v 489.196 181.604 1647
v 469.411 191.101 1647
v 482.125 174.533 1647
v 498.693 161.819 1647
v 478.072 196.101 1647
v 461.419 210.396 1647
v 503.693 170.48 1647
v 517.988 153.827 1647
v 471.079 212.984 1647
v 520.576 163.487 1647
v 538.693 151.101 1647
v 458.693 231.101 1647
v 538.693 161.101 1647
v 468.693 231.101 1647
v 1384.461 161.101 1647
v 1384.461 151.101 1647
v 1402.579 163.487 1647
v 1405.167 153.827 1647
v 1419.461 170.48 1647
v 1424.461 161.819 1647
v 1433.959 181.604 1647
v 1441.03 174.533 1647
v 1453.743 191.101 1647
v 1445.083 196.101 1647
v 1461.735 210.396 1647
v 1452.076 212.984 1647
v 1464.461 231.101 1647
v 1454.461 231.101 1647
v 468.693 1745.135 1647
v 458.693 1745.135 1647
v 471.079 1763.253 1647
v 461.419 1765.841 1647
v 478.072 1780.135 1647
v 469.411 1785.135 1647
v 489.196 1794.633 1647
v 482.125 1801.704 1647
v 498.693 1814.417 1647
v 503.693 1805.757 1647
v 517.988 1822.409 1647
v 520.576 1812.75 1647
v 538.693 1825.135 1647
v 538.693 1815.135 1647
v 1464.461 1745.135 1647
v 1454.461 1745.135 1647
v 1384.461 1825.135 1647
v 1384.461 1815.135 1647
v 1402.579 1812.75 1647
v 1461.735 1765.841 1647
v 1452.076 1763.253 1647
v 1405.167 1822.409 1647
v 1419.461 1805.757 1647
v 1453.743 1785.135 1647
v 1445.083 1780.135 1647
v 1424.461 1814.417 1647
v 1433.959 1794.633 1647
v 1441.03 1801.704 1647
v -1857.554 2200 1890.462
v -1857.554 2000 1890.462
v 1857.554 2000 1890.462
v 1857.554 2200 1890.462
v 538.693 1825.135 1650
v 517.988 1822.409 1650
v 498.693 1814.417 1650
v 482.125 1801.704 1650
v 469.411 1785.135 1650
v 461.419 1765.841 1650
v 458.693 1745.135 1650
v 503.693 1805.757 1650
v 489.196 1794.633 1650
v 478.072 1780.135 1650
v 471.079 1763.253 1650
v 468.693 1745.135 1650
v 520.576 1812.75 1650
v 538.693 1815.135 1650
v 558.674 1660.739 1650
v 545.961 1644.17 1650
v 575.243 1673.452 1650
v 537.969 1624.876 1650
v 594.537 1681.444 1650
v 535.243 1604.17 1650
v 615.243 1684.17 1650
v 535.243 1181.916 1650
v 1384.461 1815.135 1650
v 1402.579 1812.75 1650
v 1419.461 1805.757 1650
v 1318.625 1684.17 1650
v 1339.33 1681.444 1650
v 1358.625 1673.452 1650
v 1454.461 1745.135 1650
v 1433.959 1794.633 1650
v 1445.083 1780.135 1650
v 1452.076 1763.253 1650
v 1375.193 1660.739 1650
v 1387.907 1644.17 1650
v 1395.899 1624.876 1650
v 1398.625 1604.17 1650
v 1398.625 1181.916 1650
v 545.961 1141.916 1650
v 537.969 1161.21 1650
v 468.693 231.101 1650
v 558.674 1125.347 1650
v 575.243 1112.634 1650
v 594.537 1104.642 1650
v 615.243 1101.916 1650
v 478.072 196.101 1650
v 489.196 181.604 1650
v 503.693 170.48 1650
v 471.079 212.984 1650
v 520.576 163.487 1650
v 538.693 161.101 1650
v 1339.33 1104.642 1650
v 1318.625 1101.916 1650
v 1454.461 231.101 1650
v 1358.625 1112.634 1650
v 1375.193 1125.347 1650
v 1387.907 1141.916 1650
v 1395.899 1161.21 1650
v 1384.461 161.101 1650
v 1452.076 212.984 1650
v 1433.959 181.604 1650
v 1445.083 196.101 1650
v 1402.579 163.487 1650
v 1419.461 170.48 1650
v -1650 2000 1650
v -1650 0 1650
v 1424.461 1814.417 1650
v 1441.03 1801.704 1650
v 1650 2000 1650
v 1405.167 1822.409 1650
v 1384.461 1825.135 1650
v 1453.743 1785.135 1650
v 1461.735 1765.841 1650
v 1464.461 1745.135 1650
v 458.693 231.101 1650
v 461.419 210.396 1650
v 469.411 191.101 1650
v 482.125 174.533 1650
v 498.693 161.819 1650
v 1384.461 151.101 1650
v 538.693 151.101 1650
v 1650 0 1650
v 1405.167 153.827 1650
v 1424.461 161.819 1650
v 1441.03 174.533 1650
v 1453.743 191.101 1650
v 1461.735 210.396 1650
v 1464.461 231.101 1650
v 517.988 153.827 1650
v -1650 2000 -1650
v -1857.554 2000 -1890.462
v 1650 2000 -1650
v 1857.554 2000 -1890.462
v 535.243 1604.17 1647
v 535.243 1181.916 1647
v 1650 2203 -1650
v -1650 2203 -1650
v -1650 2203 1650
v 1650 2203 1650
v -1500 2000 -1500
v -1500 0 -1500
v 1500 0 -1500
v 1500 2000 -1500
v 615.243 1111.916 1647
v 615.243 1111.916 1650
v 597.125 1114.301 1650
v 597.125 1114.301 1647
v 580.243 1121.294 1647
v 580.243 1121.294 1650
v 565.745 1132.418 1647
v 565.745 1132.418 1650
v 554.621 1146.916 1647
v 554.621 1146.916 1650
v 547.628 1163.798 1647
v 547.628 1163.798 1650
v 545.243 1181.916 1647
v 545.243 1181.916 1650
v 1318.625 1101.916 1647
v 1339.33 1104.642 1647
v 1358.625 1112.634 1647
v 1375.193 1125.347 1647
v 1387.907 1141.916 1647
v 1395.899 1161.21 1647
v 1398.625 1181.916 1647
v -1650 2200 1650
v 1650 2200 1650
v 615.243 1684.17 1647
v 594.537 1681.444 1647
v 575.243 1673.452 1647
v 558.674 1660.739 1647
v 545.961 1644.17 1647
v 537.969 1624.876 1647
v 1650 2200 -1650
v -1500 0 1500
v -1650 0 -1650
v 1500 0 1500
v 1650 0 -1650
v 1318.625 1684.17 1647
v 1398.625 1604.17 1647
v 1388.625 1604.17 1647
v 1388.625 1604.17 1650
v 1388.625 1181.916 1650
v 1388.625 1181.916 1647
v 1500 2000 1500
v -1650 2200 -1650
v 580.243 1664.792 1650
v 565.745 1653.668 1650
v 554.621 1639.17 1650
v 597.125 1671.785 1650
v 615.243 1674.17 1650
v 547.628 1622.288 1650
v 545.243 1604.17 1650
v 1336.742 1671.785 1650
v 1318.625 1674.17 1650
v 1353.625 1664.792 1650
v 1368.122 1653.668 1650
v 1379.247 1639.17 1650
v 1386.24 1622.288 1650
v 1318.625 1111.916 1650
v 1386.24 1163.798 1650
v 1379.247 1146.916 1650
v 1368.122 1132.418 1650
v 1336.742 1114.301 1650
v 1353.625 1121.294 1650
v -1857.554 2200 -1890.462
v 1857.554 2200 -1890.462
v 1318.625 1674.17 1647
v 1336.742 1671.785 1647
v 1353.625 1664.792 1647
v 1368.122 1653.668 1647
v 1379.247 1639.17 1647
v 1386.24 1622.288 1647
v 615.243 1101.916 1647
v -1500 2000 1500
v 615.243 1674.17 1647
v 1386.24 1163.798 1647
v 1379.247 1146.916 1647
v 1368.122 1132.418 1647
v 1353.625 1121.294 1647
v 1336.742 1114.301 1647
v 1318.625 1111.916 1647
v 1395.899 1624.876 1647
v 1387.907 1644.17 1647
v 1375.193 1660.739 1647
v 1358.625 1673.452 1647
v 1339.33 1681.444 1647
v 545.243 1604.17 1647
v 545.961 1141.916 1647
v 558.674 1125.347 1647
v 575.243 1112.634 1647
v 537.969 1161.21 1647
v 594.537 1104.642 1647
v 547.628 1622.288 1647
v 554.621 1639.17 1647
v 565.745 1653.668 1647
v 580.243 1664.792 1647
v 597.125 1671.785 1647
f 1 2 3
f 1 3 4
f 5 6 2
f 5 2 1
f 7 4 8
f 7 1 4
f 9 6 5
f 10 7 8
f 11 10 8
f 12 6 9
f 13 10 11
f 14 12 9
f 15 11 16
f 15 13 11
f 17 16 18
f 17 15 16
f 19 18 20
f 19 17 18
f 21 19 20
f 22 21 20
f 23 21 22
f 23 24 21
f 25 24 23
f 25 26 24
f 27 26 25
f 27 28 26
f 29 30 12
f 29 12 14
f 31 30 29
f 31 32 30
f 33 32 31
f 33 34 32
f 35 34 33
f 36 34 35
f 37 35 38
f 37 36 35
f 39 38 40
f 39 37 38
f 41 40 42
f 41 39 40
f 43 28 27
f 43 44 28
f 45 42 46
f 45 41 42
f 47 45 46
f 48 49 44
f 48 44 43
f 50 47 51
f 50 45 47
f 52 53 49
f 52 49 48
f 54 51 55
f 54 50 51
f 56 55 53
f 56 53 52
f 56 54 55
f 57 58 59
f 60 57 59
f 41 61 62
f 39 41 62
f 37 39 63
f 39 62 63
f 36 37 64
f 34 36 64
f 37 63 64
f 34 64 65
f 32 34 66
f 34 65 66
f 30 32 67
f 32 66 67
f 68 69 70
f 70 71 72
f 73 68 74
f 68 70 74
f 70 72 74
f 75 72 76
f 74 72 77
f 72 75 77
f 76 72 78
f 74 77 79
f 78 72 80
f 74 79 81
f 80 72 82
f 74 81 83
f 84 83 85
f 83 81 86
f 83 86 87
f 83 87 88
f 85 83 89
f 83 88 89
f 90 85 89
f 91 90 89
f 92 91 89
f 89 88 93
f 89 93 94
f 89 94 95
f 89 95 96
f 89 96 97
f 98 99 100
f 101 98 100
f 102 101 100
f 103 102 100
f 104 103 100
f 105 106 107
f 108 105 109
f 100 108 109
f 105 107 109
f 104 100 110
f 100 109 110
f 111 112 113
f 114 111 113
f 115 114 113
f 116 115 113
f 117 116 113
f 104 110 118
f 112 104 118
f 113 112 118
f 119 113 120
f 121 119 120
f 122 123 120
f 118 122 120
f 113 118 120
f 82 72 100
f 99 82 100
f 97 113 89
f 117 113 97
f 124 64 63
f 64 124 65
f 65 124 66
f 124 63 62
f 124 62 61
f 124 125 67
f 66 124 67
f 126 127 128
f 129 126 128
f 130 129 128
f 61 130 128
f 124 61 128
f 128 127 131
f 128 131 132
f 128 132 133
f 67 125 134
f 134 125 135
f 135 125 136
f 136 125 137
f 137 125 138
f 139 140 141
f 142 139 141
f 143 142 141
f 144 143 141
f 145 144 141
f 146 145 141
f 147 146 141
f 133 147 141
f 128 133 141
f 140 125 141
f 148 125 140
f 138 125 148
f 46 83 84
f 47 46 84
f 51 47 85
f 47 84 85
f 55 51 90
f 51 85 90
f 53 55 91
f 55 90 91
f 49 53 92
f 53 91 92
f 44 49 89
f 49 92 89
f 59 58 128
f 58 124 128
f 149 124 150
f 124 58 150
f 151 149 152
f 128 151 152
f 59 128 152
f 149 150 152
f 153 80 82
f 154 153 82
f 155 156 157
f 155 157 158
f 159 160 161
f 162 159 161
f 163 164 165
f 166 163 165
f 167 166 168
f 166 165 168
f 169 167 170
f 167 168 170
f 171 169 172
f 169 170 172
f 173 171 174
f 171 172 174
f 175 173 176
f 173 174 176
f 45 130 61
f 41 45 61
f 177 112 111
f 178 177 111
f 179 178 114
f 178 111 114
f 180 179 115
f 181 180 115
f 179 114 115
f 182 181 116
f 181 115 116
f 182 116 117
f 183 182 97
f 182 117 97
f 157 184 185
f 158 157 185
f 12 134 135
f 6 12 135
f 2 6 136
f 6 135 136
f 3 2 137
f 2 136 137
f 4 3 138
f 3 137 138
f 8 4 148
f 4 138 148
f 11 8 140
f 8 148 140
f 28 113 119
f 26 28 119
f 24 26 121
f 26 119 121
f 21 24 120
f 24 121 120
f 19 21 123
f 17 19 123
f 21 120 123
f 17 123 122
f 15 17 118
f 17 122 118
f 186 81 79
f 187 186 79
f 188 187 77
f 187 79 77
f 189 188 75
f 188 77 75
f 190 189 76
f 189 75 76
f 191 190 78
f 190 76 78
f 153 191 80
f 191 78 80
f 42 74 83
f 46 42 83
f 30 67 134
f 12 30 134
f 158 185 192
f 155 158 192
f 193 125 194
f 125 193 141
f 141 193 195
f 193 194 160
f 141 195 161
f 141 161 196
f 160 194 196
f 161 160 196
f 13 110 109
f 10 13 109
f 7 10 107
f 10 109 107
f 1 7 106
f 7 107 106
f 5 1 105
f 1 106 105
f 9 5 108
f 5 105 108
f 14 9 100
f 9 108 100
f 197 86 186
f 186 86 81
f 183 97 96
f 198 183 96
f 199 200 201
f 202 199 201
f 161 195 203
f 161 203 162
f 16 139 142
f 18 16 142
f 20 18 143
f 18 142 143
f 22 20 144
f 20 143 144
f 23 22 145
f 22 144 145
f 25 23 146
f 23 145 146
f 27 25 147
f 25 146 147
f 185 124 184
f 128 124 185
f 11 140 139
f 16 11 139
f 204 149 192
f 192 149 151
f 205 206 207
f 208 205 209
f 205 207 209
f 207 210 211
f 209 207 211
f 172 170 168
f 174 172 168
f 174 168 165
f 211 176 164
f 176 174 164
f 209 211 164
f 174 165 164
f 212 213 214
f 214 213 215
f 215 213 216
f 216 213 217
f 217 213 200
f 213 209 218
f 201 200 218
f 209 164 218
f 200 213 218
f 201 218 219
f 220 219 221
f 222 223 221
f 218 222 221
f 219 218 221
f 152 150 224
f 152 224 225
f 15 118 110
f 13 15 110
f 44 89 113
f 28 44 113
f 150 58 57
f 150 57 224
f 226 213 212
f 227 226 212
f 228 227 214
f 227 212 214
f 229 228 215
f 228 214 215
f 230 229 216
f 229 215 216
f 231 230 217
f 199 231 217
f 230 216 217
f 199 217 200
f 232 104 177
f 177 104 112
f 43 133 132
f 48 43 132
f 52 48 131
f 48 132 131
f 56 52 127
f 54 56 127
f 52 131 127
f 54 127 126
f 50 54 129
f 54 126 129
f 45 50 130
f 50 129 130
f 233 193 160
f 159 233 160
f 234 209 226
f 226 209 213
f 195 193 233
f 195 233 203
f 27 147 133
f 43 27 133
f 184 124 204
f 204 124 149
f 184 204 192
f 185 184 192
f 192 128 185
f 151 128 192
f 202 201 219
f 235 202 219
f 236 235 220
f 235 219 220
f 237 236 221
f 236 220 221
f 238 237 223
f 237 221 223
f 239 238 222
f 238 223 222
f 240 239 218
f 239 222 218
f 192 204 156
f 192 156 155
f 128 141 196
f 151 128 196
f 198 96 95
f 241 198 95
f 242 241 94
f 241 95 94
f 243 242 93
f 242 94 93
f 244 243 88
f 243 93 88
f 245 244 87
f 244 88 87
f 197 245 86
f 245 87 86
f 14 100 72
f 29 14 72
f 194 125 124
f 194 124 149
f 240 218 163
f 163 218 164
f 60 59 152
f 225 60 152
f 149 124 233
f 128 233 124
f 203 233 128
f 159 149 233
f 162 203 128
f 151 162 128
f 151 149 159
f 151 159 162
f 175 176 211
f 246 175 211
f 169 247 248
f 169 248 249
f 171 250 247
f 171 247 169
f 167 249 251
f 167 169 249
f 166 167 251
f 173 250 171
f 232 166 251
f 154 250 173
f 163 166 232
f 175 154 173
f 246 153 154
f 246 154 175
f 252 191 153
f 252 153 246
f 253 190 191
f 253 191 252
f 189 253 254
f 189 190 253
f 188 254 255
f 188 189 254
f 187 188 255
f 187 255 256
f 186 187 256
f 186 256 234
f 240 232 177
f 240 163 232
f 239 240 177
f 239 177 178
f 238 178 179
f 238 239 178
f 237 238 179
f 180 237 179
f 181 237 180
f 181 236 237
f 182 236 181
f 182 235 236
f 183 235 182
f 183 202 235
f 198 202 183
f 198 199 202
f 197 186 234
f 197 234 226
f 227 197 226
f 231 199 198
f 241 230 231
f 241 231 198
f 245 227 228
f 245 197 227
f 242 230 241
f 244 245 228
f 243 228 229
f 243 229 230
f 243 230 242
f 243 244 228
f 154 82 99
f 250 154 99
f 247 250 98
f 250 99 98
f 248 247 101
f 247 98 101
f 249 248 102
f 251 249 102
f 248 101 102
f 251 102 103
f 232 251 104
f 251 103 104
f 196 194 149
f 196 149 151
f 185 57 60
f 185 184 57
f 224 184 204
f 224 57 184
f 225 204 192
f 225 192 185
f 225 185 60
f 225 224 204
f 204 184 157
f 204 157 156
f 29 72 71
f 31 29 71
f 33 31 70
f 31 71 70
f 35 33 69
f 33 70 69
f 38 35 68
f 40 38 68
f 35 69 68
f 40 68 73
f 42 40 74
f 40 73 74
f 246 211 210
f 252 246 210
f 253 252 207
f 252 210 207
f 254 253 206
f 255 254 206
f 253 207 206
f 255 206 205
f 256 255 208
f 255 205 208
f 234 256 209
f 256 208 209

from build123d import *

# Parameters (mm, degrees)
CROQUIS1_W              = 3300
CROQUIS1_H              = 3300
CROQUIS1_W_2            = 3000
CROQUIS1_H_2            = 3000
SALIENTE_EXTRUIR1_DEPTH = 2000
CROQUIS2_W              = 3715.107812374
CROQUIS2_H              = 3780.923334612
CROQUIS2_W_2            = 3300
CROQUIS2_H_2            = 3300
SALIENTE_EXTRUIR2_DEPTH = 200
CORTAR_EXTRUIR1_DEPTH   = 3
CORTAR_EXTRUIR2_DEPTH   = 3
CROQUIS5_W              = 3300
CROQUIS5_H              = 3300
SALIENTE_EXTRUIR3_DEPTH = 3


with BuildPart() as part:
    # Croquis1 → Saliente-Extruir1 (new body)
    with BuildSketch(Plane(origin=(0, 0, 0), x_dir=(1, 0, 0), z_dir=(0, 1, 0))):
        Rectangle(CROQUIS1_W, CROQUIS1_H)
        Rectangle(CROQUIS1_W_2, CROQUIS1_H_2, mode=Mode.SUBTRACT)
    extrude(amount=SALIENTE_EXTRUIR1_DEPTH)

    # Croquis3 → Cortar-Extruir1 (cut)
    with BuildSketch(Plane.XY.offset(1650)):
        with BuildLine():
            Line((458.693356997, 1745.135347933), (458.693356997, 231.101371952))
            ThreePointArc((458.693356997, 231.101371952), (482.124814502, 174.532829457), (538.693356997, 151.101371952))
            Line((538.693356997, 151.101371952), (1384.461320744, 151.101371952))
            ThreePointArc((1384.461320744, 151.101371952), (1441.029863239, 174.532829457), (1464.461320744, 231.101371952))
            Line((1464.461320744, 231.101371952), (1464.461320744, 1745.135347933))
            ThreePointArc((1464.461320744, 1745.135347933), (1441.029863239, 1801.703890428), (1384.461320744, 1825.135347933))
            Line((1384.461320744, 1825.135347933), (538.693356997, 1825.135347933))
            ThreePointArc((538.693356997, 1825.135347933), (482.124814502, 1801.703890428), (458.693356997, 1745.135347933))
        make_face()
        with BuildLine():
            Line((538.693356997, 1815.135347933), (1384.461320744, 1815.135347933))
            ThreePointArc((1384.461320744, 1815.135347933), (1433.958795427, 1794.632822616), (1454.461320744, 1745.135347933))
            Line((1454.461320744, 1745.135347933), (1454.461320744, 231.101371952))
            ThreePointArc((1454.461320744, 231.101371952), (1433.958795427, 181.603897269), (1384.461320744, 161.101371952))
            Line((1384.461320744, 161.101371952), (538.693356997, 161.101371952))
            ThreePointArc((538.693356997, 161.101371952), (489.195882313, 181.603897269), (468.693356997, 231.101371952))
            Line((468.693356997, 231.101371952), (468.693356997, 1745.135347933))
            ThreePointArc((468.693356997, 1745.135347933), (489.195882313, 1794.632822616), (538.693356997, 1815.135347933))
        make_face(mode=Mode.SUBTRACT)
    extrude(amount=-CORTAR_EXTRUIR1_DEPTH, mode=Mode.SUBTRACT)

    # Croquis4 → Cortar-Extruir2 (cut)
    with BuildSketch(Plane.XY.offset(1650)):
        with BuildLine():
            Line((535.242823134, 1604.170281482), (535.242823134, 1181.915657145))
            ThreePointArc((535.242823134, 1181.915657145), (558.674280639, 1125.34711465), (615.242823134, 1101.915657145))
            Line((615.242823134, 1101.915657145), (1318.624759638, 1101.915657145))
            ThreePointArc((1318.624759638, 1101.915657145), (1375.193302133, 1125.34711465), (1398.624759638, 1181.915657145))
            Line((1398.624759638, 1181.915657145), (1398.624759638, 1604.170281482))
            ThreePointArc((1398.624759638, 1604.170281482), (1375.193302133, 1660.738823977), (1318.624759638, 1684.170281482))
            Line((1318.624759638, 1684.170281482), (615.242823134, 1684.170281482))
            ThreePointArc((615.242823134, 1684.170281482), (558.674280639, 1660.738823977), (535.242823134, 1604.170281482))
        make_face()
        with BuildLine():
            Line((615.242823134, 1674.170281482), (1318.624759638, 1674.170281482))
            ThreePointArc((1318.624759638, 1674.170281482), (1368.122234322, 1653.667756165), (1388.624759638, 1604.170281482))
            Line((1388.624759638, 1604.170281482), (1388.624759638, 1181.915657145))
            ThreePointArc((1388.624759638, 1181.915657145), (1368.122234322, 1132.418182462), (1318.624759638, 1111.915657145))
            Line((1318.624759638, 1111.915657145), (615.242823134, 1111.915657145))
            ThreePointArc((615.242823134, 1111.915657145), (565.74534845, 1132.418182462), (545.242823134, 1181.915657145))
            Line((545.242823134, 1181.915657145), (545.242823134, 1604.170281482))
            ThreePointArc((545.242823134, 1604.170281482), (565.74534845, 1653.667756165), (615.242823134, 1674.170281482))
        make_face(mode=Mode.SUBTRACT)
    extrude(amount=-CORTAR_EXTRUIR2_DEPTH, mode=Mode.SUBTRACT)


with BuildPart() as body_2:
    # Croquis2 → Saliente-Extruir2 (new body)
    with BuildSketch(Plane(origin=(0, 2000, 0), x_dir=(1, 0, 0), z_dir=(0, 1, 0))):
        Rectangle(CROQUIS2_W, CROQUIS2_H)
        Rectangle(CROQUIS2_W_2, CROQUIS2_H_2, mode=Mode.SUBTRACT)
    extrude(amount=SALIENTE_EXTRUIR2_DEPTH)


with BuildPart() as body_3:
    # Croquis5 → Saliente-Extruir3 (new body)
    with BuildSketch(Plane(origin=(0, 2200, 0), x_dir=(1, 0, 0), z_dir=(0, 1, 0))):
        Rectangle(CROQUIS5_W, CROQUIS5_H)
    extrude(amount=SALIENTE_EXTRUIR3_DEPTH)


solid = Compound([part.part, body_2.part, body_3.part])
